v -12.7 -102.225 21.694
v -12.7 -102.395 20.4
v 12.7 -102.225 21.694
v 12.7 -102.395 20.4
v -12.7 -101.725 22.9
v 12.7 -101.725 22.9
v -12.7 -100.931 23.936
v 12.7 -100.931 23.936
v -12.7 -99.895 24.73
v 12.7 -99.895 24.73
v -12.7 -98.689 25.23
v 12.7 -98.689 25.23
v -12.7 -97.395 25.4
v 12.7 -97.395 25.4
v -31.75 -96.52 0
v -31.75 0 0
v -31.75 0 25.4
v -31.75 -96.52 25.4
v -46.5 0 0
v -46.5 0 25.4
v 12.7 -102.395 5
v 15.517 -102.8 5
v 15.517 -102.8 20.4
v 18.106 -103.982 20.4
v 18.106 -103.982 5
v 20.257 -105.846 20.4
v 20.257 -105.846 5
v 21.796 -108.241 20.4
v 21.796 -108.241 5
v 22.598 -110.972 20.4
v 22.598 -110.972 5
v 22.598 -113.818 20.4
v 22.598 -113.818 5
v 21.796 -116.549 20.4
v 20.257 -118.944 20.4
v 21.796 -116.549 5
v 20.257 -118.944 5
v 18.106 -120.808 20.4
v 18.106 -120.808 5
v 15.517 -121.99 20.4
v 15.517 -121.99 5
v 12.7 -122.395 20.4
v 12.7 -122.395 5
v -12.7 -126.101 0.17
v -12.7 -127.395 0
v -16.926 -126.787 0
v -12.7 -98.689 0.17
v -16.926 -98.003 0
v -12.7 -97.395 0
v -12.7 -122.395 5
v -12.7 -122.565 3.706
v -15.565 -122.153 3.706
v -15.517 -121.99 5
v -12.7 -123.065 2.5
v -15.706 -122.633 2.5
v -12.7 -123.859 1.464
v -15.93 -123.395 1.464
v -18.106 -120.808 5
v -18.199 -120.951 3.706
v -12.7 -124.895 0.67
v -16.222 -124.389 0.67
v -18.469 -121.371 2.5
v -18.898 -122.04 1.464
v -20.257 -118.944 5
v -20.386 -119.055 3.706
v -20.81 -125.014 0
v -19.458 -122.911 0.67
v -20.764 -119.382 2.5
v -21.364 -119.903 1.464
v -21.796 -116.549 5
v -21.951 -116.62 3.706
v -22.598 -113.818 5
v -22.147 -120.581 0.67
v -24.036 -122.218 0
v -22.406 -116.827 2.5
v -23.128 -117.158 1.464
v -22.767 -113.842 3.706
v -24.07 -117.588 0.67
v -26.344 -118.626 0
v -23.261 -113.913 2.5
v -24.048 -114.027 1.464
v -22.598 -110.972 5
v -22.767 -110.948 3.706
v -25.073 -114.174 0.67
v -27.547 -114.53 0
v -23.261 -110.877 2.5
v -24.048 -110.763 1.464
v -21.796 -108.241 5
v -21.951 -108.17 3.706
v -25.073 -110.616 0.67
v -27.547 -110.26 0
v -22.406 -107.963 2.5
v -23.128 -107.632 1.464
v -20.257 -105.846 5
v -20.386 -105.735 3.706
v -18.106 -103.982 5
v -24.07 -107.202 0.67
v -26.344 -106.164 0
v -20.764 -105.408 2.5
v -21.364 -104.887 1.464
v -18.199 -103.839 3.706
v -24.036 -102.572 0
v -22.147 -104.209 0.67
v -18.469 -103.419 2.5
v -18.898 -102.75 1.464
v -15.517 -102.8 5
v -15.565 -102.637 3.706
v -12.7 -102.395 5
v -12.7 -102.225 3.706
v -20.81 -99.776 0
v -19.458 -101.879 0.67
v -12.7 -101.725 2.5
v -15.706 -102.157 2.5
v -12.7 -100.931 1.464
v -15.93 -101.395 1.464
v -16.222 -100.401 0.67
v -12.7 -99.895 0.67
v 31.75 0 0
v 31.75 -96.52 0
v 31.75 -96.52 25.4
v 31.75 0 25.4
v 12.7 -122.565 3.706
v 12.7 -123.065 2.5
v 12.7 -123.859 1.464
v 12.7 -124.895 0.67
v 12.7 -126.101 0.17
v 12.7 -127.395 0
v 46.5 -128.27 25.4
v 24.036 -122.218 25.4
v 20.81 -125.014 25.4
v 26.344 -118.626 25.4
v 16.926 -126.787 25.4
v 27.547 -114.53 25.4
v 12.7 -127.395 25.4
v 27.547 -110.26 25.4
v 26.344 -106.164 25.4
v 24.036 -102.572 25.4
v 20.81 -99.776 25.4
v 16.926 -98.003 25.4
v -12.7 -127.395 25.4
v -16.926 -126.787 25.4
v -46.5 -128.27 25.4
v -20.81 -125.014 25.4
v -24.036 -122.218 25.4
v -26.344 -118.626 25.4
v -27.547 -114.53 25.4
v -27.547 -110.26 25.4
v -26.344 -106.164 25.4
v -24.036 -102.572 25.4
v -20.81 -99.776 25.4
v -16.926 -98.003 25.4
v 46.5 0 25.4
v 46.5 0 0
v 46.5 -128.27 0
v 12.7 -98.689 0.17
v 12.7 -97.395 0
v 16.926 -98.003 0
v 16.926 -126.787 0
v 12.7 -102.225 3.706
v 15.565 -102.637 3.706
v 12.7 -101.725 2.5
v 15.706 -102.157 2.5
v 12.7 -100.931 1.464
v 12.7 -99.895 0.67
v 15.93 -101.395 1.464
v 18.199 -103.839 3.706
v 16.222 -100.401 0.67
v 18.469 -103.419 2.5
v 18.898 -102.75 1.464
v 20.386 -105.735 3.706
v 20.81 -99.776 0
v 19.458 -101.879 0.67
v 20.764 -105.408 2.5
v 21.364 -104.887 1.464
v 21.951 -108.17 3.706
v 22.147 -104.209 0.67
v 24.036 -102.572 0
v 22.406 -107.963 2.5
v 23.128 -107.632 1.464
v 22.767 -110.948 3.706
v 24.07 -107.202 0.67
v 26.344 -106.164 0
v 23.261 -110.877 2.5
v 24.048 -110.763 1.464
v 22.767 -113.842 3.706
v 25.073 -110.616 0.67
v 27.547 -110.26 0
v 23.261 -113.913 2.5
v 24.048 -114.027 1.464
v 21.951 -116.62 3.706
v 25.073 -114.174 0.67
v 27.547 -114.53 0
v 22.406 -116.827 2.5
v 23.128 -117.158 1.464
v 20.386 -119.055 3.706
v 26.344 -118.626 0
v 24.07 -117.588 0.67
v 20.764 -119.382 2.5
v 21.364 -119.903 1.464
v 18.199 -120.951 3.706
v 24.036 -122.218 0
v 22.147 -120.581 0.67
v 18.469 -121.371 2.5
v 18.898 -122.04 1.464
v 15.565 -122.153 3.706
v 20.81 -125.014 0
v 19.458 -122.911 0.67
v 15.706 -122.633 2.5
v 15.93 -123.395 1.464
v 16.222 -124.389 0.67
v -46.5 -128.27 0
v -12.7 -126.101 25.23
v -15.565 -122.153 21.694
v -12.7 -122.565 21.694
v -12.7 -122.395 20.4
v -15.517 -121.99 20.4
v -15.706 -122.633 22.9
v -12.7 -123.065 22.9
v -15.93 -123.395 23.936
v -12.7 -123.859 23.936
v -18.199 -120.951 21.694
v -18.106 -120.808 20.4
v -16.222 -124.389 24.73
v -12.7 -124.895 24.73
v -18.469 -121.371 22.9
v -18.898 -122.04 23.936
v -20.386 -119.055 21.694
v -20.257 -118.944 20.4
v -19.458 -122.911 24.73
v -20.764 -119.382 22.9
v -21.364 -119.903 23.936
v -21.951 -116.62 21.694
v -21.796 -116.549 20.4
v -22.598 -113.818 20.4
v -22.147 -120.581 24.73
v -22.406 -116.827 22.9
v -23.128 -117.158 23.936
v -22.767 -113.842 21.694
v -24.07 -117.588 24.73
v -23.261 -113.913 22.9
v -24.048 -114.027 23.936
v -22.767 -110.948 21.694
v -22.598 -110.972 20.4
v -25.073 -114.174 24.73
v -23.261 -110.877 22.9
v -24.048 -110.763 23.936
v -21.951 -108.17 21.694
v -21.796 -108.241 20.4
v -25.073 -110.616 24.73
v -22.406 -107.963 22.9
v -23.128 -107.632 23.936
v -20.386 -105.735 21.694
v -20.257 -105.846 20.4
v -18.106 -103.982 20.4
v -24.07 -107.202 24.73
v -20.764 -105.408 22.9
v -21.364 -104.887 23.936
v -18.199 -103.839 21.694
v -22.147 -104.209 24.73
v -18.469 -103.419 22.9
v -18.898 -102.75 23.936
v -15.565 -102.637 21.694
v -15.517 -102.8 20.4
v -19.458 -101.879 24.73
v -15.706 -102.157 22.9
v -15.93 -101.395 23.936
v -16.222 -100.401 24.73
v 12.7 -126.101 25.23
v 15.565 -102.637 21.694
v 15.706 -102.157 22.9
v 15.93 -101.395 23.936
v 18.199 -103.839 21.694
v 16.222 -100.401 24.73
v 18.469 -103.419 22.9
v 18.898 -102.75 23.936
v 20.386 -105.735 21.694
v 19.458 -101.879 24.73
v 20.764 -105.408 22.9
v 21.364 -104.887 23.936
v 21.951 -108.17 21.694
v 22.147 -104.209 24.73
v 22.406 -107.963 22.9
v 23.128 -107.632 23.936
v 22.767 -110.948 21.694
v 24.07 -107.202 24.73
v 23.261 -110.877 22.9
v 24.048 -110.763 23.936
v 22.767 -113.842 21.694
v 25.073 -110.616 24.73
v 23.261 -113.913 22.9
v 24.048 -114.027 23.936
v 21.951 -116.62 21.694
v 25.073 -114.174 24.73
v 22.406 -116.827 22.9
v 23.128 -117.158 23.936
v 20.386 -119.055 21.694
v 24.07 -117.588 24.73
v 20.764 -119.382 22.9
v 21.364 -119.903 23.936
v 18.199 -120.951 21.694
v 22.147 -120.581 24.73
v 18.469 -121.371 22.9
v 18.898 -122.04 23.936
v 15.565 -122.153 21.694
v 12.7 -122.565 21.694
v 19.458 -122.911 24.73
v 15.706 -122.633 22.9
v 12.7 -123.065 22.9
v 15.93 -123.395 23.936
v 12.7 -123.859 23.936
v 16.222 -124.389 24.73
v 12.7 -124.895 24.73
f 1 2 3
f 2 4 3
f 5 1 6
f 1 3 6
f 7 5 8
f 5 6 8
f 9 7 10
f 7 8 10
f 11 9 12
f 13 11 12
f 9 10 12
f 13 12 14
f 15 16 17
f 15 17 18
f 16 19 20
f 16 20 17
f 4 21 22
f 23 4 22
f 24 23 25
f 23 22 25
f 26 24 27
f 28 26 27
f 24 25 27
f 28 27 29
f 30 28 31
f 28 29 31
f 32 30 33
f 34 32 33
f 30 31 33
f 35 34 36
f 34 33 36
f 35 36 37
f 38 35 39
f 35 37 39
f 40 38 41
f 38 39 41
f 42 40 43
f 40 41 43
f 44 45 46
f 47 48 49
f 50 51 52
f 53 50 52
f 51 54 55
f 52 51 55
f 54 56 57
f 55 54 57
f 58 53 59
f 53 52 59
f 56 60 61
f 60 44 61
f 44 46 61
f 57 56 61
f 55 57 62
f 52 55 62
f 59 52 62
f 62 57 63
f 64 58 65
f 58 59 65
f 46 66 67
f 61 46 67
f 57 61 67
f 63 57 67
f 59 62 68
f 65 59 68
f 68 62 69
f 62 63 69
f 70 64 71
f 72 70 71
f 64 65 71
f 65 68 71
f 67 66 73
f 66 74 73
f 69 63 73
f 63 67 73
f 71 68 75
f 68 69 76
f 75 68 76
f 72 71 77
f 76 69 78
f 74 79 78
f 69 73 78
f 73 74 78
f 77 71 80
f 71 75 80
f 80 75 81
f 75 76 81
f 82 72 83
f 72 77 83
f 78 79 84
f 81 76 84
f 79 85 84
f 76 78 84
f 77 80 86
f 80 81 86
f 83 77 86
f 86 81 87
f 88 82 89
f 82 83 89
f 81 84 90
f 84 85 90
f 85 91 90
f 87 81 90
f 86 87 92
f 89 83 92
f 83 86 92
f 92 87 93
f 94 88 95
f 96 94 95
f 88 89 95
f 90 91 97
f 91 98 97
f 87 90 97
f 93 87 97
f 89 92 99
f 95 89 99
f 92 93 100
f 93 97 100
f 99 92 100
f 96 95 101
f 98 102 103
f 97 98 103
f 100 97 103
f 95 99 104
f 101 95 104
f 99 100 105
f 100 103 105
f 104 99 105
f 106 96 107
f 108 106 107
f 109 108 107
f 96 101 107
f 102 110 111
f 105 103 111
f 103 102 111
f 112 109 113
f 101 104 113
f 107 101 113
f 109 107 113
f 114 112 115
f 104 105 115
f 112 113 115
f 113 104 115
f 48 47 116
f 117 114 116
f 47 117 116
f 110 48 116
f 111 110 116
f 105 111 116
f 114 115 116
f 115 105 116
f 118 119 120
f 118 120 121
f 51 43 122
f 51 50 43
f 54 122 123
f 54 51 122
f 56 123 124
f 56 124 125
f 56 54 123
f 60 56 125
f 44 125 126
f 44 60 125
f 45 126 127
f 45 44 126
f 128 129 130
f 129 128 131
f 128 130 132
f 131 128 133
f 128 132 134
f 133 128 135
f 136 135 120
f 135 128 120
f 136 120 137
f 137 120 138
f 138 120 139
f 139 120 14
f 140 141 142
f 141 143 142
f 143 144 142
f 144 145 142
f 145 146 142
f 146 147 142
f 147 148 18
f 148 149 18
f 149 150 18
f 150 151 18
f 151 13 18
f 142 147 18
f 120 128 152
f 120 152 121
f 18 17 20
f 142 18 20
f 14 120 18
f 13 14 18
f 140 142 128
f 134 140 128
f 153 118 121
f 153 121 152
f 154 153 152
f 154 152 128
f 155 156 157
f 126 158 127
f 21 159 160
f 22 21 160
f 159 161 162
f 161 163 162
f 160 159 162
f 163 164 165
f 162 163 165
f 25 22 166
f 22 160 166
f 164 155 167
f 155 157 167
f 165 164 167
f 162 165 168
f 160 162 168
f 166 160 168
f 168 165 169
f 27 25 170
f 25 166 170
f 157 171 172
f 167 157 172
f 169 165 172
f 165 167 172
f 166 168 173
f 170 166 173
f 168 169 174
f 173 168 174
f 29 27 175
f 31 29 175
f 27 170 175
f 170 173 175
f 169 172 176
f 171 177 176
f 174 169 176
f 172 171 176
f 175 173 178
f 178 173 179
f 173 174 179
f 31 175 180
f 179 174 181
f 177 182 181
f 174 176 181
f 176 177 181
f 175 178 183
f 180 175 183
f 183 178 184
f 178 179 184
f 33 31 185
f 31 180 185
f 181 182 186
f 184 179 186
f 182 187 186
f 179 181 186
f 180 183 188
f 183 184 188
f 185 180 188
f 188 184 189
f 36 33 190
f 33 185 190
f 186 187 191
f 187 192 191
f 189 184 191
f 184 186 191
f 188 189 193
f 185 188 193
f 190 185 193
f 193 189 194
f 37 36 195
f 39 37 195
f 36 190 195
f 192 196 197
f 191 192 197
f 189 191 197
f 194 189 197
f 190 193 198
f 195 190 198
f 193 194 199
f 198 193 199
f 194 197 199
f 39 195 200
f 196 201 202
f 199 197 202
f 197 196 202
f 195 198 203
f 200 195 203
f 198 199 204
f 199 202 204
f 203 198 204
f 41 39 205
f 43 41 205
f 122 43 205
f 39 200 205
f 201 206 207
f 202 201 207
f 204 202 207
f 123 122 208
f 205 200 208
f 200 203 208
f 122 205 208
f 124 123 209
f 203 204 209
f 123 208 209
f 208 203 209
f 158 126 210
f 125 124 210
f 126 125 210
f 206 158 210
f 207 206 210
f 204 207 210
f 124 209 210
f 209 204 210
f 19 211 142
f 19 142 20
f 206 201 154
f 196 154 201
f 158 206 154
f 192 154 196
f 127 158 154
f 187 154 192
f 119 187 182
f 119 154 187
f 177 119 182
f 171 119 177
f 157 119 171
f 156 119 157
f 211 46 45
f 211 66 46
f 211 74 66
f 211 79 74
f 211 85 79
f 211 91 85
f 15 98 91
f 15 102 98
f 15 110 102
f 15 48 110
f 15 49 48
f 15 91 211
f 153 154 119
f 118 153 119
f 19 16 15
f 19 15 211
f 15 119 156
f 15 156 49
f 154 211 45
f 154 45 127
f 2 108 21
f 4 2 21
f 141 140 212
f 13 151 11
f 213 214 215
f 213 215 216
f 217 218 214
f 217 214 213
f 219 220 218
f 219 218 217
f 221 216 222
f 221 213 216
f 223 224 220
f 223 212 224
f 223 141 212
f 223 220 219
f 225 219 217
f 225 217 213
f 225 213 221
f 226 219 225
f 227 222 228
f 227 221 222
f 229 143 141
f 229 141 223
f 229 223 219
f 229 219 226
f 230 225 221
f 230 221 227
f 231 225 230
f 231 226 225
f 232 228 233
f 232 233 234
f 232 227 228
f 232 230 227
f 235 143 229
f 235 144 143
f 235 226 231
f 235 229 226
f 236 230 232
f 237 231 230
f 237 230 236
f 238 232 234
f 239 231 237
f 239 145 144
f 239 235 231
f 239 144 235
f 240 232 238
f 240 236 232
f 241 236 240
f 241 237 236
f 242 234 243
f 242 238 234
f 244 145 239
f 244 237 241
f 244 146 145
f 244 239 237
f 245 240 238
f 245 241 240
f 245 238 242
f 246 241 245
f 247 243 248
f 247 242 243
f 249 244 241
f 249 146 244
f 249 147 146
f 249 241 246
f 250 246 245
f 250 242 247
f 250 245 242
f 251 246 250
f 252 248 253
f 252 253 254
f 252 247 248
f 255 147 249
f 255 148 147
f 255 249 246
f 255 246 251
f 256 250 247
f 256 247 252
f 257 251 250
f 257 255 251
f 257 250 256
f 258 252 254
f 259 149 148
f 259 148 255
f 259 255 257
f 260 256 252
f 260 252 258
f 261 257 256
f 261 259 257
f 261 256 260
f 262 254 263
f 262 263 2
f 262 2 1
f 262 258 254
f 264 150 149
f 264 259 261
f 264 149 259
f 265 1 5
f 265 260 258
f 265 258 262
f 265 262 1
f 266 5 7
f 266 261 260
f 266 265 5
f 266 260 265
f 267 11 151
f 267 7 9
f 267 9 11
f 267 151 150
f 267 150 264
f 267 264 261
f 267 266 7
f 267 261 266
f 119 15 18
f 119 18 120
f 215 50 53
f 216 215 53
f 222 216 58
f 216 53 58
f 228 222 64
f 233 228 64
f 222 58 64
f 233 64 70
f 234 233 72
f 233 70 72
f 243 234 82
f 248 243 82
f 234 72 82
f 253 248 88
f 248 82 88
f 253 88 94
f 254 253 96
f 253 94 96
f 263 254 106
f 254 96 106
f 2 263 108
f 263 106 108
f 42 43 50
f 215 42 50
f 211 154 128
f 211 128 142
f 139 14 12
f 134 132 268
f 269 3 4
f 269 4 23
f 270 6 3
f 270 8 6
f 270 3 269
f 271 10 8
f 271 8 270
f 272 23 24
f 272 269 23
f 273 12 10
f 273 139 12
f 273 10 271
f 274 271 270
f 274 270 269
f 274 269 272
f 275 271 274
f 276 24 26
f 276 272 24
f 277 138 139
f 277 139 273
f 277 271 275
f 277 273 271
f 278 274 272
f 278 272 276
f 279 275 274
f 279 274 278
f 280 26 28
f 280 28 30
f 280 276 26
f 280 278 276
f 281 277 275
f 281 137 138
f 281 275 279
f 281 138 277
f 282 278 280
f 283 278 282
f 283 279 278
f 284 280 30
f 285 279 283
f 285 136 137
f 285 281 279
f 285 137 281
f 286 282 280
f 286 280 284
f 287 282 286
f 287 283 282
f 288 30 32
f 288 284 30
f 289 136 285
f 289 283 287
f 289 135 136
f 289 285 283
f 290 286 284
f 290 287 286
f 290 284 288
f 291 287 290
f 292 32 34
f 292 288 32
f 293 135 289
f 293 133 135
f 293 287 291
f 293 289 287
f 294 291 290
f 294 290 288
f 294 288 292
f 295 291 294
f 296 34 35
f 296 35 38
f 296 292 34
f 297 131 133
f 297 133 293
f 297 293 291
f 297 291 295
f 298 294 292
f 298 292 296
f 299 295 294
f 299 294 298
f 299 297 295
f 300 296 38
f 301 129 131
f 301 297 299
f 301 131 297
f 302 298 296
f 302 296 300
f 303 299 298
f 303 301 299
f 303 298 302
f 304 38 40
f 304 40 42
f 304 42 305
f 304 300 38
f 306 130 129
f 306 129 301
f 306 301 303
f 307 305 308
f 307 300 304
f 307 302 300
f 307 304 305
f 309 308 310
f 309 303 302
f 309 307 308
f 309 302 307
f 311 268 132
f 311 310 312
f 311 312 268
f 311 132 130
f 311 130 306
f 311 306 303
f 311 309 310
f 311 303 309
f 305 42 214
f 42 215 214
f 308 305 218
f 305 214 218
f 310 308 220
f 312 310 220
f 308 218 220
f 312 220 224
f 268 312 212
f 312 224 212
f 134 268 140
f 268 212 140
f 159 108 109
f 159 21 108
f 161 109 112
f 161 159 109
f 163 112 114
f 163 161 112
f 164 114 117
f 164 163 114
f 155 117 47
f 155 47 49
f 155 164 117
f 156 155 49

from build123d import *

# Parameters (mm, degrees)
BOSS_EXTRUDE1_DEPTH = 25.4
FILLET1_R           = 5


with BuildPart() as part:
    # Sketch1 → Boss-Extrude1 (new body)
    with BuildSketch(Plane.XY):
        Polygon((-46.5, 0), (-31.75, 0), (-31.75, -96.52), (31.75, -96.52), (31.75, 0), (46.5, 0), (46.5, -128.27), (-46.5, -128.27), align=None)
        with BuildLine():
            Line((-12.7, -102.395), (12.7, -102.395))
            ThreePointArc((12.7, -102.395), (22.7, -112.395), (12.7, -122.395))
            Line((12.7, -122.395), (-12.7, -122.395))
            ThreePointArc((-12.7, -122.395), (-22.7, -112.395), (-12.7, -102.395))
        make_face(mode=Mode.SUBTRACT)
    extrude(amount=BOSS_EXTRUDE1_DEPTH)

    # Fillet1
    fillet1_edges = [part.edges().sort_by_distance(p)[0] for p in [
        (-22.7, -112.395, 0),
        (0, -122.395, 0),
        (22.7, -112.395, 0),
        (0, -102.395, 0),
        (-22.7, -112.395, 25.4),
        (0, -122.395, 25.4),
        (22.7, -112.395, 25.4),
        (0, -102.395, 25.4),
    ]]
    fillet(fillet1_edges, radius=FILLET1_R)


solid = part.part
